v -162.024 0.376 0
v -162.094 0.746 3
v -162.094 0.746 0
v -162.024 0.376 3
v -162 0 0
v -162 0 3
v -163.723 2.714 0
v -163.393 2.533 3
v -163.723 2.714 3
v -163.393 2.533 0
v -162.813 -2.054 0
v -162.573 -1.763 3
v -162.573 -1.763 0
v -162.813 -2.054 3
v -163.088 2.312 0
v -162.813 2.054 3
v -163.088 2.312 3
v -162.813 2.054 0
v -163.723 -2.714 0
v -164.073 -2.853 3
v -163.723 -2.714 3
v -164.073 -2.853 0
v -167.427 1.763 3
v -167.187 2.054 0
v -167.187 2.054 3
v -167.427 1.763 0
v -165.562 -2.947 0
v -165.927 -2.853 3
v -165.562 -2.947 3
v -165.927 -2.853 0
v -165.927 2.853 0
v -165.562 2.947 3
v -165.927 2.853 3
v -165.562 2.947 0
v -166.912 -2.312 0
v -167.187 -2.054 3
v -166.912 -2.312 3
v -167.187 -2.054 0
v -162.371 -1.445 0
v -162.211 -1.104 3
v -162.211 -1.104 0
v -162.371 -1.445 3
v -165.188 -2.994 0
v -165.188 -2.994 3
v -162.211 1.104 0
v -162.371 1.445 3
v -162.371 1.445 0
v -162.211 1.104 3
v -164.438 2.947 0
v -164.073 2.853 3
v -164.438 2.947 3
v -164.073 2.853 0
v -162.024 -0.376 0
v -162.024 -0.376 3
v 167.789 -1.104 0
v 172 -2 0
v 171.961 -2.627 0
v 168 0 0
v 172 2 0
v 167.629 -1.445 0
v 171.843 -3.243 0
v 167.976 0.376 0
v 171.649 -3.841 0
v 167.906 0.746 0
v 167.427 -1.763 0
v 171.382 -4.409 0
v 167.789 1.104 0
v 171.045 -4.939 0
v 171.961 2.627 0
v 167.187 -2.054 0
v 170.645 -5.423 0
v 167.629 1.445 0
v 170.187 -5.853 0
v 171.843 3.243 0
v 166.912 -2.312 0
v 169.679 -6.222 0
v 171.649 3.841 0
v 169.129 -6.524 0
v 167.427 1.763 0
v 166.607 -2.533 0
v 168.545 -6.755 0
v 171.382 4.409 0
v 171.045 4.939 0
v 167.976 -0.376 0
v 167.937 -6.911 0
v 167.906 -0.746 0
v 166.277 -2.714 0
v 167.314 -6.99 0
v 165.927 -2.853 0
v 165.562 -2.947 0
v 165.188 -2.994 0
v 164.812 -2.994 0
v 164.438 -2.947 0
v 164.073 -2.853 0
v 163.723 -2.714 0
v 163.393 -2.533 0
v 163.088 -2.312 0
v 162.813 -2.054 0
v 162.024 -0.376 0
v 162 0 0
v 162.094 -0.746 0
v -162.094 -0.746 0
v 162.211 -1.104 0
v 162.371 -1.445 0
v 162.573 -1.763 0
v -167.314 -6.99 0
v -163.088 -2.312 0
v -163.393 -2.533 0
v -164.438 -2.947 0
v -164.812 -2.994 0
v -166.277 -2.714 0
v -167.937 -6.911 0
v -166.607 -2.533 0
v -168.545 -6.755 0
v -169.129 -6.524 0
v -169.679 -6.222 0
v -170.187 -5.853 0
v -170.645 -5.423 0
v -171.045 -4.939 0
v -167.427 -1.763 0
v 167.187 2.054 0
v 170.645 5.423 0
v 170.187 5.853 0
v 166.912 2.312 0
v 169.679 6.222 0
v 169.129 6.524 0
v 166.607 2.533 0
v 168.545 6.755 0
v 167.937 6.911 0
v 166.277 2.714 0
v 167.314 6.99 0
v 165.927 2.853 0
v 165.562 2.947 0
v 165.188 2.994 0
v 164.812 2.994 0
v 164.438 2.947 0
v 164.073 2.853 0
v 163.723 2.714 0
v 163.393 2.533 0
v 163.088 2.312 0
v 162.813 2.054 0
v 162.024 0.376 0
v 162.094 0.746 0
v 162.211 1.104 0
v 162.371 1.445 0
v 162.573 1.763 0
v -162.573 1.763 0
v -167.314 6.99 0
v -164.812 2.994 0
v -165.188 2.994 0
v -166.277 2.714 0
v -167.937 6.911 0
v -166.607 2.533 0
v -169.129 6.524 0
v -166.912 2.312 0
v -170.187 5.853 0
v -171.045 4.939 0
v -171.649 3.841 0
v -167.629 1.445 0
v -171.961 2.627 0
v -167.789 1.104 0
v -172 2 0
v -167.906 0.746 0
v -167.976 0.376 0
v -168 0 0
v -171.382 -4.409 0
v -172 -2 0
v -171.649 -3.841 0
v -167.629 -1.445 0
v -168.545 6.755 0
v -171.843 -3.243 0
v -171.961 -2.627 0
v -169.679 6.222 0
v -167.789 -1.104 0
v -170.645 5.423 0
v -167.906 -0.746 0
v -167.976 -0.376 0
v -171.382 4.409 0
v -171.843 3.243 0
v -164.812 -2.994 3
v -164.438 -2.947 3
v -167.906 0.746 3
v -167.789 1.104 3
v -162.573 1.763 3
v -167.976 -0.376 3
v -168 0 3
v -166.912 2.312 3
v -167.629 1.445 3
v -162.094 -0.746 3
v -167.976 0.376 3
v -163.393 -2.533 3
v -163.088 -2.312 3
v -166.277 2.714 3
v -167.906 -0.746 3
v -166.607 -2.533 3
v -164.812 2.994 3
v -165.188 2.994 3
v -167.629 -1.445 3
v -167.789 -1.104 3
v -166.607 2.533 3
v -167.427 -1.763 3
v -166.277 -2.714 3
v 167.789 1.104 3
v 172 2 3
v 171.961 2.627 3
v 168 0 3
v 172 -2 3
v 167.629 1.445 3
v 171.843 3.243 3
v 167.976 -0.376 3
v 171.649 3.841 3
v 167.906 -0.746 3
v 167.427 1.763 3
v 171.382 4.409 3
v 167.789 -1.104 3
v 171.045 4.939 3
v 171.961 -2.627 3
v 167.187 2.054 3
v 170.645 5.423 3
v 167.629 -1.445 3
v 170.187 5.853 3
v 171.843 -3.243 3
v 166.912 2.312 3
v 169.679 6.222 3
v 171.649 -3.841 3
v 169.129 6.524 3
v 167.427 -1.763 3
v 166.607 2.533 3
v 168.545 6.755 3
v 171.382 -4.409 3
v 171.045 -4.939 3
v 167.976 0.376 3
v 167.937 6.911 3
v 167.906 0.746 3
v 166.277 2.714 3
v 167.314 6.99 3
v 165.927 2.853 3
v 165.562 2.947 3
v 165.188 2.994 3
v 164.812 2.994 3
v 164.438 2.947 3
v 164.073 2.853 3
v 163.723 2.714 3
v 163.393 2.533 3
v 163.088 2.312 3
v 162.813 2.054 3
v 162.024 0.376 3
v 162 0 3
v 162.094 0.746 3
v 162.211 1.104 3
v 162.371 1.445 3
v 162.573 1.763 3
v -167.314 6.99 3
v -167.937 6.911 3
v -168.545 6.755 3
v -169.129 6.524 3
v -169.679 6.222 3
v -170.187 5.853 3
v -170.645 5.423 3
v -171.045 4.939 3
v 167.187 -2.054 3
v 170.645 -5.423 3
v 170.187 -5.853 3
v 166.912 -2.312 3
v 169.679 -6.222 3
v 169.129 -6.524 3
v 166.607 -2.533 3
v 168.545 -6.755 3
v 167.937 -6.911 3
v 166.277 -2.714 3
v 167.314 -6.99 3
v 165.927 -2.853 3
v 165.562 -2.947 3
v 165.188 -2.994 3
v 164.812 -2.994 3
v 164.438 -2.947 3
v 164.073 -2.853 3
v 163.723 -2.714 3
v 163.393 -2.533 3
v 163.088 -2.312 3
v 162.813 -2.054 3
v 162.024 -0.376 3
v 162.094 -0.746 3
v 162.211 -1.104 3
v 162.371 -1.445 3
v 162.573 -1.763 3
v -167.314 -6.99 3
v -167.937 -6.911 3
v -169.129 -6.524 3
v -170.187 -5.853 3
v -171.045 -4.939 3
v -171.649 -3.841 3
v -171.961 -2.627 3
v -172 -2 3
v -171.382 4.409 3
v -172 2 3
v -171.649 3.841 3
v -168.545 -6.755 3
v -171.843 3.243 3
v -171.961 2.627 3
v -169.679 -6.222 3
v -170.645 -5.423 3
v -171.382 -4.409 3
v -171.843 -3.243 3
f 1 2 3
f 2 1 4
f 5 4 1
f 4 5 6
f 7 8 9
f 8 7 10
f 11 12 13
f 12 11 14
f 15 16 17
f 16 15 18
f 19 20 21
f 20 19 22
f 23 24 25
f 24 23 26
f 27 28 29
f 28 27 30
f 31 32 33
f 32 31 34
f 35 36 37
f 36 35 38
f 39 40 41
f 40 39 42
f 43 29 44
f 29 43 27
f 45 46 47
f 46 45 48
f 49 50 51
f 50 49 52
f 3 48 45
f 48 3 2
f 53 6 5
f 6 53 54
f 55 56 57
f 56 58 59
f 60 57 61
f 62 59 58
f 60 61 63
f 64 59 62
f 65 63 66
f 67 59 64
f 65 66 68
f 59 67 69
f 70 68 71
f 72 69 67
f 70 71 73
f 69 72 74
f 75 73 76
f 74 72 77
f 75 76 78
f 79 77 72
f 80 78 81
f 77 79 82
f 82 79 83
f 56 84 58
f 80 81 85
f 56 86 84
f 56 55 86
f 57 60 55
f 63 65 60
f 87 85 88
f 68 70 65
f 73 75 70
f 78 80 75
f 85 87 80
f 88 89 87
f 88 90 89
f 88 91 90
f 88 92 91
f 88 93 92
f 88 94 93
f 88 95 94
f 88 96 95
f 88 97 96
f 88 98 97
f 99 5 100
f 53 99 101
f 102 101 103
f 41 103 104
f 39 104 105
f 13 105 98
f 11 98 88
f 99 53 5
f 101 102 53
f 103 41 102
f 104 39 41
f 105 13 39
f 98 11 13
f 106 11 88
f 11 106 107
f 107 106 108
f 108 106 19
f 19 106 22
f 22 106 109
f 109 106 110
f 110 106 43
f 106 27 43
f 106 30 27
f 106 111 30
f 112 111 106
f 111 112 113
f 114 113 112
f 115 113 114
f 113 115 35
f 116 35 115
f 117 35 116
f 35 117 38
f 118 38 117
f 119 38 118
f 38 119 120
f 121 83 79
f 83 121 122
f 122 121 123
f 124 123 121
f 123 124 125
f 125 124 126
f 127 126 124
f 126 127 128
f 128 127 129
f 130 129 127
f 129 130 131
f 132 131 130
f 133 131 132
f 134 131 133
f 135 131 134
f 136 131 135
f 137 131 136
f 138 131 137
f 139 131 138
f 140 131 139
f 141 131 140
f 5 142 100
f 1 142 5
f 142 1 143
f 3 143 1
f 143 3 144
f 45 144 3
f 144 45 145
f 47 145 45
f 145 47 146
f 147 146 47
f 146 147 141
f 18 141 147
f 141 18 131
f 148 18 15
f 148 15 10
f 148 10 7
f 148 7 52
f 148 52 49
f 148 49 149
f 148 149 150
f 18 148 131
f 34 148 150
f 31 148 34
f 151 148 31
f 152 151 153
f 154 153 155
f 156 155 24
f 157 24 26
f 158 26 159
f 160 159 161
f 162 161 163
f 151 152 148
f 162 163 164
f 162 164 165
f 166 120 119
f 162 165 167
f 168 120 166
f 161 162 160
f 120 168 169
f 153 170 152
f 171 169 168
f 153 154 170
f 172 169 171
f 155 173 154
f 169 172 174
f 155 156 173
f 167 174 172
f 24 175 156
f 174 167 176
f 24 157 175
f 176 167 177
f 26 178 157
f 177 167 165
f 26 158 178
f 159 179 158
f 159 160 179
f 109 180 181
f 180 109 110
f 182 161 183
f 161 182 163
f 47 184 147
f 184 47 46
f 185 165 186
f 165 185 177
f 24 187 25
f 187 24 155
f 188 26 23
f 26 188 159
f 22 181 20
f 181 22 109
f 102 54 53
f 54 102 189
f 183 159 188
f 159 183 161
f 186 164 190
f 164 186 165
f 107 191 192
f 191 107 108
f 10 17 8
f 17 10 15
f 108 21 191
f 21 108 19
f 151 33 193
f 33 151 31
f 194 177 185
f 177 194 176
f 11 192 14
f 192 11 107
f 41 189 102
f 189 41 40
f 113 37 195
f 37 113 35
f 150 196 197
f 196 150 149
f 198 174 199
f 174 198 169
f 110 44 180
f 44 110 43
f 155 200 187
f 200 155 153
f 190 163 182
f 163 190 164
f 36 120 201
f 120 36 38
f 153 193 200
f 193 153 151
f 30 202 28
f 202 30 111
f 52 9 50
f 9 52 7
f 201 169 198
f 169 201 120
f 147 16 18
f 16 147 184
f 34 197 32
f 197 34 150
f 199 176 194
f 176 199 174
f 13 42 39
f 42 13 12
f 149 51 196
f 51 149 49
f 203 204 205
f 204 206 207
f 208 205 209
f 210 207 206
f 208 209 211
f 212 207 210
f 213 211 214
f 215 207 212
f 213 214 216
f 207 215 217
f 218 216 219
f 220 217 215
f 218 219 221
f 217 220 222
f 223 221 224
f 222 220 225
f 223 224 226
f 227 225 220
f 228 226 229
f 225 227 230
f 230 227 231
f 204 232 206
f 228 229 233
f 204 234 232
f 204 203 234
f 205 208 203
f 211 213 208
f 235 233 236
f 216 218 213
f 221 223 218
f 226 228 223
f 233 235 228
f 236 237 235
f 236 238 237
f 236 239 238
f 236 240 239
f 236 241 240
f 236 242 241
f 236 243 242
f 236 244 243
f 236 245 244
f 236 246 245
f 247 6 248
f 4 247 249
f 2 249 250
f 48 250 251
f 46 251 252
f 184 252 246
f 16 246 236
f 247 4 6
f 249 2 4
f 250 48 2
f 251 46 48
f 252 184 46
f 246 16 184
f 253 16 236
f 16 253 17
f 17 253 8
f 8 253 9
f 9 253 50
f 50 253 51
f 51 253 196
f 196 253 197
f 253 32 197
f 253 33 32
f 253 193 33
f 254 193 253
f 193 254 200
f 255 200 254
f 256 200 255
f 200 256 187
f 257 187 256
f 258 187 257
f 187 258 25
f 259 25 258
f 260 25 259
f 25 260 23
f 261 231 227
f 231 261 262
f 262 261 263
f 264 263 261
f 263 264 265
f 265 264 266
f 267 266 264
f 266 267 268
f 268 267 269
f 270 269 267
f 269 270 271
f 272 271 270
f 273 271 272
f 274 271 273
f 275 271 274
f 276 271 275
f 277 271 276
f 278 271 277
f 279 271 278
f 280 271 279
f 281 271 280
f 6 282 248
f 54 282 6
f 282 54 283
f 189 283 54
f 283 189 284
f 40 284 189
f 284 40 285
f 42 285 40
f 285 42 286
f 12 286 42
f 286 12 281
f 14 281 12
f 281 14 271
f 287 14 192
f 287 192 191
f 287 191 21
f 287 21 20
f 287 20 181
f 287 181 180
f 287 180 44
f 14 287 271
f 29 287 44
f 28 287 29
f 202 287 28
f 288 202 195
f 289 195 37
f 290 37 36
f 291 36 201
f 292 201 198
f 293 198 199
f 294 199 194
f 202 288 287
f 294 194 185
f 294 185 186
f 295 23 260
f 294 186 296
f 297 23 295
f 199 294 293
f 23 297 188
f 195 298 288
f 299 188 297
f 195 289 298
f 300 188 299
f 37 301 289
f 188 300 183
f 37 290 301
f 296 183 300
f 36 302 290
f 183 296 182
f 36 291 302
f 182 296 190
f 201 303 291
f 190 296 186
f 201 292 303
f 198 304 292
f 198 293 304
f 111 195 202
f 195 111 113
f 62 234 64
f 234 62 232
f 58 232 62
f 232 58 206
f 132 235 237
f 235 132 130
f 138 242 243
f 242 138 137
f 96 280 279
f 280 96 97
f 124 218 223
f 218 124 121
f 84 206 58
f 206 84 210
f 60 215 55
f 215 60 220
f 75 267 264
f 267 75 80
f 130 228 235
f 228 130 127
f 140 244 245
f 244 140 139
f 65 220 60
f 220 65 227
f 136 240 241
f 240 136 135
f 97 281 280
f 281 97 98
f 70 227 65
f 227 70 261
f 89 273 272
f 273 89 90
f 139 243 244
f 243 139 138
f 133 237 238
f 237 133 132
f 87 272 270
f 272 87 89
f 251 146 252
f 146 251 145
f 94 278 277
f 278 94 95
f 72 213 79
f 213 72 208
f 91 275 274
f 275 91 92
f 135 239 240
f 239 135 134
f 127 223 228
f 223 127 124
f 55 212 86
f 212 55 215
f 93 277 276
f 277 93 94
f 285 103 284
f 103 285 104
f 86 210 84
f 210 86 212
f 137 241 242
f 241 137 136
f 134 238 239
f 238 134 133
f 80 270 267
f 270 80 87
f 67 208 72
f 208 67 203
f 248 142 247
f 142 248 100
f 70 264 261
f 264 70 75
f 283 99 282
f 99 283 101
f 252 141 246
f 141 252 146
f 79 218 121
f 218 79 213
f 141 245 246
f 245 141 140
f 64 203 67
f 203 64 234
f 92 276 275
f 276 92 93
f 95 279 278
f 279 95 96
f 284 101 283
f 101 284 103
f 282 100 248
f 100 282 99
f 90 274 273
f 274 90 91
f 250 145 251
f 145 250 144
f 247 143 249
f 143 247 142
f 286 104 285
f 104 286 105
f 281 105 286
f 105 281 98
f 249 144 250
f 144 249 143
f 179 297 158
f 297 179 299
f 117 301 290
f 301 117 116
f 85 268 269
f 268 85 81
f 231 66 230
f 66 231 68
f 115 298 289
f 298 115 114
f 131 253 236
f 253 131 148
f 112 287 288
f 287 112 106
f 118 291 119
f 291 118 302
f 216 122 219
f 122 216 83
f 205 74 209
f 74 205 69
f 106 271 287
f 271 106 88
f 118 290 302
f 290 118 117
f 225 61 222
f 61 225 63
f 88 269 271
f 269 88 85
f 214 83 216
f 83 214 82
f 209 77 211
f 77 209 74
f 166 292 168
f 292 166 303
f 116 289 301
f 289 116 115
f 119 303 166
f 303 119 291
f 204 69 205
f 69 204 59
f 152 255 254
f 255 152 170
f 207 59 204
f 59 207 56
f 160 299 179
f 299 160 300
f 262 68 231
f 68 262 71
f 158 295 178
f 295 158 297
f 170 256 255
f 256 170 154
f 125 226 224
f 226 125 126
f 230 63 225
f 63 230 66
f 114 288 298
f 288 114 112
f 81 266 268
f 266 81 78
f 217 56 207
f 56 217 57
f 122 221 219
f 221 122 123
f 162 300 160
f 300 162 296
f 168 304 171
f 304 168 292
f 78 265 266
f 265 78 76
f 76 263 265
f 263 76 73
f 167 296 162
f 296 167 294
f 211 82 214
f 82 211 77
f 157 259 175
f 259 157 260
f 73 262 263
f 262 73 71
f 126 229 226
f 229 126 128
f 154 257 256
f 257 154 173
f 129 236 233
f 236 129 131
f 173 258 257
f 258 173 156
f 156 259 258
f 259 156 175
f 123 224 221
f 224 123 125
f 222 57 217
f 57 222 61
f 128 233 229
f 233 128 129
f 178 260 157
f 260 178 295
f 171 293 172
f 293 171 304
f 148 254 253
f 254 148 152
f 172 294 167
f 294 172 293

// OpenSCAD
$fn = 50;


difference() {
	union() {
		hull() {
			translate(v = [-167.0000000000, 2.0000000000, 0]) {
				cylinder(h = 3, r = 5);
			}
			translate(v = [167.0000000000, 2.0000000000, 0]) {
				cylinder(h = 3, r = 5);
			}
			translate(v = [-167.0000000000, -2.0000000000, 0]) {
				cylinder(h = 3, r = 5);
			}
			translate(v = [167.0000000000, -2.0000000000, 0]) {
				cylinder(h = 3, r = 5);
			}
		}
	}
	union() {
		translate(v = [-165.0000000000, 0.0000000000, 0]) {
			cylinder(h = 3, r = 3.0000000000);
		}
		translate(v = [165.0000000000, 0.0000000000, 0]) {
			cylinder(h = 3, r = 3.0000000000);
		}
		translate(v = [-165.0000000000, 0.0000000000, 0]) {
			cylinder(h = 3, r = 1.5000000000);
		}
		translate(v = [165.0000000000, 0.0000000000, 0]) {
			cylinder(h = 3, r = 1.5000000000);
		}
		translate(v = [-165.0000000000, 0.0000000000, 0]) {
			cylinder(h = 3, r = 1.5000000000);
		}
		translate(v = [165.0000000000, 0.0000000000, 0]) {
			cylinder(h = 3, r = 1.5000000000);
		}
		translate(v = [-165.0000000000, 0.0000000000, 0]) {
			cylinder(h = 3, r = 1.5000000000);
		}
		translate(v = [165.0000000000, 0.0000000000, 0]) {
			cylinder(h = 3, r = 1.5000000000);
		}
	}
}
